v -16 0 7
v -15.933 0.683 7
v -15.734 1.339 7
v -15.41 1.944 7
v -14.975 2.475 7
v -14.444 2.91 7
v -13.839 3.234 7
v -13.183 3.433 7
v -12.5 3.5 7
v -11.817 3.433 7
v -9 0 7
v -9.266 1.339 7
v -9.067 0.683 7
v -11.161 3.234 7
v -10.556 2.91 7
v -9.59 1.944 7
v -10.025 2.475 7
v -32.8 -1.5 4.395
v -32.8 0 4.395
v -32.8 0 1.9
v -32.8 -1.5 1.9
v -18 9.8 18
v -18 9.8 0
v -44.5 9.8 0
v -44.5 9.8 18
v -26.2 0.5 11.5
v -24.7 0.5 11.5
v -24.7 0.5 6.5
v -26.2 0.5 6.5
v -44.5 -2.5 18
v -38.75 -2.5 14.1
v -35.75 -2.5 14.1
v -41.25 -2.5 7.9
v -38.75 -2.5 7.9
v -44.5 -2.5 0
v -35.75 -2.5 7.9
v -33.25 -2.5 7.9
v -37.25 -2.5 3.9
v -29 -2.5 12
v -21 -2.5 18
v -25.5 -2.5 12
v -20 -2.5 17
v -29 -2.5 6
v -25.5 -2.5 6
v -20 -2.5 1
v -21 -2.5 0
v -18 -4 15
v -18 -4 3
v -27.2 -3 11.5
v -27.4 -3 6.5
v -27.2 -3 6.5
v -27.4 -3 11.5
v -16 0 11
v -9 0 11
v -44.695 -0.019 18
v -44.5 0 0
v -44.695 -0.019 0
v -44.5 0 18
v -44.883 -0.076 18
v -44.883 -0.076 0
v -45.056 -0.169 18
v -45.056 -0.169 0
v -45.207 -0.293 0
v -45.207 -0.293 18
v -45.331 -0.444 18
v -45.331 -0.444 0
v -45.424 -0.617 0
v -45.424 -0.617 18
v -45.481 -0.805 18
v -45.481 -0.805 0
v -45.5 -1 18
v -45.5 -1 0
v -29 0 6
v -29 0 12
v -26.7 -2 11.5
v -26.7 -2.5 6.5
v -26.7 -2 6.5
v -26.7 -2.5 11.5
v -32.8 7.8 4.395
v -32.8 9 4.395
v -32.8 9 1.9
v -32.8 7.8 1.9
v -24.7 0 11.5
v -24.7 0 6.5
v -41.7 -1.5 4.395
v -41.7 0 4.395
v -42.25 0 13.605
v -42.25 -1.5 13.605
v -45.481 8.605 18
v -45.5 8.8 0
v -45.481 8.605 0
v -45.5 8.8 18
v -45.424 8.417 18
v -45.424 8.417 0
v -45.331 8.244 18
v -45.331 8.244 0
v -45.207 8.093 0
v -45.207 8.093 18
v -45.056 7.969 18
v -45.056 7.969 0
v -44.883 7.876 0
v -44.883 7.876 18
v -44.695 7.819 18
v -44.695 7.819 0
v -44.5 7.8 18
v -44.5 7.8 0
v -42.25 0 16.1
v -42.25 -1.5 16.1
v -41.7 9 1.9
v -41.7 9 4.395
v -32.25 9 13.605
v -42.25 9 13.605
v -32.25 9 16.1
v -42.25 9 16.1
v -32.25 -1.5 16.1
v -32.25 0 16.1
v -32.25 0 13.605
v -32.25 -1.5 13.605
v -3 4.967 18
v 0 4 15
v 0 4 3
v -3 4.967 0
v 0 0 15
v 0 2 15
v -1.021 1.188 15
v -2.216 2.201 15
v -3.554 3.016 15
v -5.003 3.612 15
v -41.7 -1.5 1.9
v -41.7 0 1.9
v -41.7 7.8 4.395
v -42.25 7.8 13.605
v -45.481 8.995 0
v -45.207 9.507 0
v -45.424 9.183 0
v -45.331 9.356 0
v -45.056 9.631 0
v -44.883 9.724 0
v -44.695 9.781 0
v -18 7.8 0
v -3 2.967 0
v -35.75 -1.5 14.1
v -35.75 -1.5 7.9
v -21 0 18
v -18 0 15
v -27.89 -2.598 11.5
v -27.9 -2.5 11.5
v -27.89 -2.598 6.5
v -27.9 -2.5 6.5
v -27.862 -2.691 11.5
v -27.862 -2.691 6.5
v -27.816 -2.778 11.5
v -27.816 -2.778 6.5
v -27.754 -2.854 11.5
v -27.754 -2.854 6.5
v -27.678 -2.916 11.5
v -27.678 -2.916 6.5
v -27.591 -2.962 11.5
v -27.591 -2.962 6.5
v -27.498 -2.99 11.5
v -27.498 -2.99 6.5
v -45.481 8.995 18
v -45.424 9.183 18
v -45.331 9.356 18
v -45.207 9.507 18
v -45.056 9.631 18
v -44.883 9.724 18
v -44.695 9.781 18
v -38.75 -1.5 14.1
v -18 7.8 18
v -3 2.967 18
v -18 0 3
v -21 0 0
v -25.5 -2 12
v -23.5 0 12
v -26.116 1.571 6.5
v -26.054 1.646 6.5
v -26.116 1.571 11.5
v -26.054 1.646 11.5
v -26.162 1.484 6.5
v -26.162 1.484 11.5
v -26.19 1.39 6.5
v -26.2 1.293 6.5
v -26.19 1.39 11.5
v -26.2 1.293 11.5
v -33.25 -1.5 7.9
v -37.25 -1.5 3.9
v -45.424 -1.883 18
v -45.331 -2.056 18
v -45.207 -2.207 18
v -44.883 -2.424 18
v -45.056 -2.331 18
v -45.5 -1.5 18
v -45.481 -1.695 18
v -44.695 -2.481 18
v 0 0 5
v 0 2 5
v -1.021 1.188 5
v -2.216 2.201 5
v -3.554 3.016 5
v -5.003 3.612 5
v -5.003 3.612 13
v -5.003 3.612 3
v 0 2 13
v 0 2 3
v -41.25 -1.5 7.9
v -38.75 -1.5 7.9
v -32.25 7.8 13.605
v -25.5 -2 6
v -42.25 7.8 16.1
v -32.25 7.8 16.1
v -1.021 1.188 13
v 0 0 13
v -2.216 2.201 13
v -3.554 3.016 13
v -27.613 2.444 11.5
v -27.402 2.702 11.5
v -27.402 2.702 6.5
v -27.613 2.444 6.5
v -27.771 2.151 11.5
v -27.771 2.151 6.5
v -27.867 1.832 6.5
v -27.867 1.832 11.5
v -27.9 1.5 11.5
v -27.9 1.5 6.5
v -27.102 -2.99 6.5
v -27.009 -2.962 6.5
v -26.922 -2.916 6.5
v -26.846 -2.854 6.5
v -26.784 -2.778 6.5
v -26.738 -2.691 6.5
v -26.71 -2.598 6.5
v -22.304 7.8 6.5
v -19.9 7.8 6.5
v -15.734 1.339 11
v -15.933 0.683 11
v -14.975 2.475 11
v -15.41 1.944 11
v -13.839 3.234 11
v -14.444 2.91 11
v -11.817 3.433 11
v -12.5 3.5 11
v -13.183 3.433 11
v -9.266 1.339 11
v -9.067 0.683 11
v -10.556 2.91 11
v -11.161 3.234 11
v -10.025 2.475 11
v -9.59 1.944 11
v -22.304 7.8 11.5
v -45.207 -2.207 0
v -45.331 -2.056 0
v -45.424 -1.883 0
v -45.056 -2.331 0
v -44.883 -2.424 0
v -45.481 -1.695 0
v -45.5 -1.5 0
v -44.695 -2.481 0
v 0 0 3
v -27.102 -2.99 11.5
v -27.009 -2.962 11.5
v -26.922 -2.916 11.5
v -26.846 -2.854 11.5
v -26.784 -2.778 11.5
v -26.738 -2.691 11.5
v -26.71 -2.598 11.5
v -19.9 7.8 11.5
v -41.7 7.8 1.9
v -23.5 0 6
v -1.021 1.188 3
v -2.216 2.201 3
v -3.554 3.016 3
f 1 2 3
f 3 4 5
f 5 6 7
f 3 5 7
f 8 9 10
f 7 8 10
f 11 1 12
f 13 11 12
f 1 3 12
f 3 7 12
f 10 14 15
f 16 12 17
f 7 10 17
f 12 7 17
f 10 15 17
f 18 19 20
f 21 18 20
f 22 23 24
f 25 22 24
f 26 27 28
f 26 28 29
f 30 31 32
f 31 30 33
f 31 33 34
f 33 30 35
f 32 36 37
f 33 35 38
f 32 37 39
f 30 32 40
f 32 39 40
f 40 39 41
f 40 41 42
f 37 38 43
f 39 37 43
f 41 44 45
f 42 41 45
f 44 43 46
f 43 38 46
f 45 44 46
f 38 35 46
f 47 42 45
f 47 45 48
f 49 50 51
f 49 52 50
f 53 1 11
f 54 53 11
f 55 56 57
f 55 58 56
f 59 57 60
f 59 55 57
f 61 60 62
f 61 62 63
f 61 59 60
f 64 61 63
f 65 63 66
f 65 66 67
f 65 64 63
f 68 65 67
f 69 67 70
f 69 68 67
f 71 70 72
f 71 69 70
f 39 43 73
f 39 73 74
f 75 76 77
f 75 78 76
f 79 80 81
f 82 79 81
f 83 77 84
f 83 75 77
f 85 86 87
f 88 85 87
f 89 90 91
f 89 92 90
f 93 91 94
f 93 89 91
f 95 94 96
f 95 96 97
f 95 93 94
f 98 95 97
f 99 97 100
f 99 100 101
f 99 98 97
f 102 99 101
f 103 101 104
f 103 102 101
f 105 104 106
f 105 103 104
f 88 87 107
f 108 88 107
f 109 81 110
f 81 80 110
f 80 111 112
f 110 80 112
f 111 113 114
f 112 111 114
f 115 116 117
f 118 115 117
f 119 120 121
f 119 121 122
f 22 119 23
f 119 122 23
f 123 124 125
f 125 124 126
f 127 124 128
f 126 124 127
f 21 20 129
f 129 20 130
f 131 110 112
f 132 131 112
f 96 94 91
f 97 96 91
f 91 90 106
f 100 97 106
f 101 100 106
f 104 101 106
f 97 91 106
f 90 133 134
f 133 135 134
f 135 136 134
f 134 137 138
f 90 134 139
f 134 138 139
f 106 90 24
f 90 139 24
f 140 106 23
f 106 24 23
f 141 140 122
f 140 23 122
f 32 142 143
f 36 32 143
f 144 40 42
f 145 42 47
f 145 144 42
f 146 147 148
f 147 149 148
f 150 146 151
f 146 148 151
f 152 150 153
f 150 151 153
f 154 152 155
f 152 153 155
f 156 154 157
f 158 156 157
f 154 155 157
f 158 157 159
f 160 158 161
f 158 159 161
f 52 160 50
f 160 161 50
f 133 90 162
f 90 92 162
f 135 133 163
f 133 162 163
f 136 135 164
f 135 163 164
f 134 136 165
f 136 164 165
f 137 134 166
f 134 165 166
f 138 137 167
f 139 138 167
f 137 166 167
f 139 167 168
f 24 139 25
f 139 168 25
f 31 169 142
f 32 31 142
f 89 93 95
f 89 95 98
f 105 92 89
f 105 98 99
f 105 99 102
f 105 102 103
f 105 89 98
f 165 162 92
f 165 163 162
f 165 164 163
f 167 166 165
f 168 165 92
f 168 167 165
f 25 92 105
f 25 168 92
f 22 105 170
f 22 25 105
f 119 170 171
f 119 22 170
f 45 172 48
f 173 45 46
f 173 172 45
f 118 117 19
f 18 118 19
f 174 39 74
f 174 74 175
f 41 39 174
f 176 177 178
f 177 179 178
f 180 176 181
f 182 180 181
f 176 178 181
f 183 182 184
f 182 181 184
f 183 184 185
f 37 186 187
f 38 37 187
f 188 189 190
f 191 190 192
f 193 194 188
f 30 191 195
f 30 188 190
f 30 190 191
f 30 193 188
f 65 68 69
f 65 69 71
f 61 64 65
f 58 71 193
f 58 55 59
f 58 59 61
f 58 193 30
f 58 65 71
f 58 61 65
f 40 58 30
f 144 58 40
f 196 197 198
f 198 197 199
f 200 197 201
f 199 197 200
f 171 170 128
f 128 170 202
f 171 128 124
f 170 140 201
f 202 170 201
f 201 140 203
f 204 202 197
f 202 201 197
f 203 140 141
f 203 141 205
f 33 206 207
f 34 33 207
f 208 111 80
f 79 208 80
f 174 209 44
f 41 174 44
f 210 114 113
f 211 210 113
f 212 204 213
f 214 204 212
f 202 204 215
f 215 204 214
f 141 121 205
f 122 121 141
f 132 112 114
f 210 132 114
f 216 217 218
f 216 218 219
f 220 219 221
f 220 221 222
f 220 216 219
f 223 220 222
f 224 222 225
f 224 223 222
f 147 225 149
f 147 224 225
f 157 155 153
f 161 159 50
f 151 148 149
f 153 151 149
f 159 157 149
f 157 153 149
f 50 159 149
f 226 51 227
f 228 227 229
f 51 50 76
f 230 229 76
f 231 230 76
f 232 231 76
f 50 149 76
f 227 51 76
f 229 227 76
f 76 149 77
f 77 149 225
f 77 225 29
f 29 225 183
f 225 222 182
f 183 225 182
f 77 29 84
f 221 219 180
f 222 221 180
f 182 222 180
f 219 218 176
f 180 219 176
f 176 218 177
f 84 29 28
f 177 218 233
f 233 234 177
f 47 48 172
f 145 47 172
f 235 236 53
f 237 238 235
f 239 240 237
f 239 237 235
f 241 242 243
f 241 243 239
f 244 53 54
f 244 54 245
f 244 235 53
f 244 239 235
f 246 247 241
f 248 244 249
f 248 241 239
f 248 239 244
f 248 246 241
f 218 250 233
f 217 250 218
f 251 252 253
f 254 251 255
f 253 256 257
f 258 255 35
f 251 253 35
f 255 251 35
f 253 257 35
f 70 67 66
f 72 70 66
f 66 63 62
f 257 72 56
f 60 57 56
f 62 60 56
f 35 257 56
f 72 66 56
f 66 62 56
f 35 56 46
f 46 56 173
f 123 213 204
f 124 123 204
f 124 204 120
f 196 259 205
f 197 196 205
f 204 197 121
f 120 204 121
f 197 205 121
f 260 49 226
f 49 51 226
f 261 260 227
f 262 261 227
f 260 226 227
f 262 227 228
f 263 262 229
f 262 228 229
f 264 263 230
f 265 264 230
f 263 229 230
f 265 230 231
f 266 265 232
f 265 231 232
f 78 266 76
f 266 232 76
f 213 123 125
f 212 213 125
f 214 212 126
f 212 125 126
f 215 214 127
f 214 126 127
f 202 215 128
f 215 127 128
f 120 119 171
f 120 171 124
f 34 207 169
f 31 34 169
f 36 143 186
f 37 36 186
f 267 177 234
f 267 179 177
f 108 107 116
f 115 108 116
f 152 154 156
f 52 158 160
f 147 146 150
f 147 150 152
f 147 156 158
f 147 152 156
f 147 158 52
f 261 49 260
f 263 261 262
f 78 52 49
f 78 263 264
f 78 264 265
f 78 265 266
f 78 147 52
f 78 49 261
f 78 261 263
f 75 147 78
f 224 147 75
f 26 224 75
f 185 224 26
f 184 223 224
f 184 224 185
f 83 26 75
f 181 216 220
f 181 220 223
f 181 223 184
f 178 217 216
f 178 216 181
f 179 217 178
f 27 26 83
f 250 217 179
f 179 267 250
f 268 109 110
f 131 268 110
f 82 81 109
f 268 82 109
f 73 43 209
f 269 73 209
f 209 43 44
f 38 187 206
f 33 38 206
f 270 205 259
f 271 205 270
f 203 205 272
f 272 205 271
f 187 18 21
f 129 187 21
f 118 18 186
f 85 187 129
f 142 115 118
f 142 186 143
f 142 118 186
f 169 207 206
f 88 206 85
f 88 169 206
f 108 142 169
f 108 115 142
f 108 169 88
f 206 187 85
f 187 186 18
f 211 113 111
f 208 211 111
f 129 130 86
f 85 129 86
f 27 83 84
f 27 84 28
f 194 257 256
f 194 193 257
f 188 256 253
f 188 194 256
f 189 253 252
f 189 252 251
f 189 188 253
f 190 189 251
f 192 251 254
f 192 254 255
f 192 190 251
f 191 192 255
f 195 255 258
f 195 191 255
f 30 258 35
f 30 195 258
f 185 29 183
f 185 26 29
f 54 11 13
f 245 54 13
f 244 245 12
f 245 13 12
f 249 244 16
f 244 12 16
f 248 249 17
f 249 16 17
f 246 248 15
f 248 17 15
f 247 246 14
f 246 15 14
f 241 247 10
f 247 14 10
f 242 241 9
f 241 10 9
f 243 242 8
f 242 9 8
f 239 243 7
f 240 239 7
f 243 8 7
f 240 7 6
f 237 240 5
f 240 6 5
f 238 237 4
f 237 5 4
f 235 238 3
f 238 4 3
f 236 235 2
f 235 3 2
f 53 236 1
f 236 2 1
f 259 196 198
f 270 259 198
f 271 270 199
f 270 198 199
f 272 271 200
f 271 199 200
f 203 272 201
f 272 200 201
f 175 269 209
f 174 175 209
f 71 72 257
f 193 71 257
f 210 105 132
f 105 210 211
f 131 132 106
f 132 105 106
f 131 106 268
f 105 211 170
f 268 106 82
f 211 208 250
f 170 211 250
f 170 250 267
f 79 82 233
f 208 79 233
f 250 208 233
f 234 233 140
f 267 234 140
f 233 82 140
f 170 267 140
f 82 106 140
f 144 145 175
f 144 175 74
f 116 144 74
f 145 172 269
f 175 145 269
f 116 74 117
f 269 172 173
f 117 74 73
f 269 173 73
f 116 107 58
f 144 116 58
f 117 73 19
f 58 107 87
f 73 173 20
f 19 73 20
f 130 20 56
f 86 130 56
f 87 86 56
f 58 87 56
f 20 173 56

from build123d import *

# Parameters (mm, degrees)
BOSS_EXTRUDE1_DEPTH     = 18
BOSS_EXTRUDE1_2_DEPTH   = 18
SKETCH2_W               = 5.5
SKETCH2_H               = 6
CUT_EXTRUDE1_DEPTH      = 3
BOSS_EXTRUDE2_DEPTH     = 6
BOSS_EXTRUDE3_START     = -9
BOSS_EXTRUDE3_DEPTH     = 2.5
FILLET7_R               = 1
FILLET8_R               = 1
FILLET10_R              = 1
FILLET11_R              = 1
BOSS_EXTRUDE4_START     = -3
BOSS_EXTRUDE4_DEPTH     = 2
BOSS_EXTRUDE5_START     = -13
BOSS_EXTRUDE5_DEPTH     = 2
FILLET12_R              = 0.5
FILLET13_R              = 0.5
CUT_EXTRUDE2_DEPTH      = 1.5
CUT_EXTRUDE2_DEPTH_BACK = 9
CUT_EXTRUDE3_DEPTH      = 51.839846577
CUT_EXTRUDE9_DEPTH      = 51.453344785
CUT_EXTRUDE9_DEPTH_BACK = 2.5
CUT_EXTRUDE10_DEPTH     = 1
BOSS_EXTRUDE8_START     = 7
BOSS_EXTRUDE8_DEPTH     = 4


with BuildPart() as part:
    # Sketch1 → Boss-Extrude1 (new body)
    with BuildSketch(Plane.XY):
        Polygon((0, 4), (-18, 9.8), (-45.5, 9.8), (-45.5, 7.8), (-18, 7.8), (0, 2), align=None)
    extrude(amount=BOSS_EXTRUDE1_DEPTH)

    # Sketch4 → Boss-Extrude3 (add, symmetric)
    with BuildSketch(Plane.XY.offset(18).offset(BOSS_EXTRUDE3_START)):
        with BuildLine():
            Line((-26.7, -2), (-24.7, 0))
            Line((-24.7, 0), (-24.7, 0.5))
            Line((-24.7, 0.5), (-26.2, 0.5))
            Line((-26.2, 0.5), (-26.2, 1.5))
            Line((-26.2, 1.5), (-19.9, 7.8))
            Line((-19.9, 7.8), (-22.304163056, 7.8))
            Line((-22.304163056, 7.8), (-27.402081528, 2.702081528))
            ThreePointArc((-27.402081528, 2.702081528), (-27.770595205, 2.150561835), (-27.9, 1.5))
            Line((-27.9, 1.5), (-27.9, -3))
            Line((-27.9, -3), (-26.7, -3))
            Line((-26.7, -3), (-26.7, -2))
        make_face()
    extrude(amount=BOSS_EXTRUDE3_DEPTH, both=True)

    # Fillet8
    fillet8_edges = [part.edges().sort_by_distance(p)[0] for p in [
        (-45.5, 7.8, 9),
    ]]
    fillet(fillet8_edges, radius=FILLET8_R)

    # Fillet10
    fillet10_edges = [part.edges().sort_by_distance(p)[0] for p in [
        (-45.5, 9.8, 9),
    ]]
    fillet(fillet10_edges, radius=FILLET10_R - 0.0001)  # a hair under: the kernel refuses the full size

    # Sketch5 → Boss-Extrude4 (add)
    with BuildSketch(Plane.XY.offset(18).offset(BOSS_EXTRUDE4_START)):
        with BuildLine():
            Line((0, 2), (0, 0))
            ThreePointArc((0, 0), (-2.215757041, 2.201466243), (-5.002612018, 3.611952761))
            Line((-5.002612018, 3.611952761), (0, 2))
        make_face()
    extrude(amount=-BOSS_EXTRUDE4_DEPTH)

    # Sketch5<2> → Boss-Extrude5 (add)
    with BuildSketch(Plane.XY.offset(18).offset(BOSS_EXTRUDE5_START)):
        with BuildLine():
            Line((0, 2), (0, 0))
            ThreePointArc((0, 0), (-2.215757041, 2.201466243), (-5.002612018, 3.611952761))
            Line((-5.002612018, 3.611952761), (0, 2))
        make_face()
    extrude(amount=-BOSS_EXTRUDE5_DEPTH)

    # Fillet12
    fillet12_edges = [part.edges().sort_by_distance(p)[0] for p in [
        (-26.7, -3, 9),
        (-27.9, -3, 9),
    ]]
    fillet(fillet12_edges, radius=FILLET12_R)

    # Fillet13
    fillet13_edges = [part.edges().sort_by_distance(p)[0] for p in [
        (-26.2, 1.5, 9),
    ]]
    fillet(fillet13_edges, radius=FILLET13_R)


with BuildPart() as body_2:
    # Sketch1 → Boss-Extrude1 2 (new body)
    with BuildSketch(Plane.XY):
        Polygon((-18, 0), (-45.5, 0), (-45.5, -2.5), (-20, -2.5), (-18, -4), align=None)
    extrude(amount=BOSS_EXTRUDE1_2_DEPTH)

    # Sketch2 → Cut-Extrude1 (cut)
    with BuildSketch(Plane.XZ.offset(2.5)):
        with Locations((-26.25, 9)):
            Rectangle(SKETCH2_W, SKETCH2_H)
    extrude(amount=-CUT_EXTRUDE1_DEPTH, mode=Mode.SUBTRACT)

    # Sketch3 → Boss-Extrude2 (add)
    with BuildSketch(Plane.XY.offset(6)):
        Polygon((-23.5, 0), (-25.5, -2), (-25.5, -2.5), (-23.5, -2.5), align=None)
    extrude(amount=BOSS_EXTRUDE2_DEPTH)

    # Fillet7
    fillet7_edges = [body_2.edges().sort_by_distance(p)[0] for p in [
        (-45.5, 0, 9),
    ]]
    fillet(fillet7_edges, radius=FILLET7_R)

    # Fillet11
    fillet11_edges = [body_2.edges().sort_by_distance(p)[0] for p in [
        (-45.5, -2.5, 9),
    ]]
    fillet(fillet11_edges, radius=FILLET11_R)


with BuildPart() as cut_extrude2_tool:
    # Sketch6 → Cut-Extrude2 (new, two sides: drawn at the far end of the back side and taken through both)
    with BuildSketch(Plane.XZ.offset(-CUT_EXTRUDE2_DEPTH_BACK)):
        Polygon((-32.8, 1.9), (-41.7, 1.9), (-41.7, 4.395495943), (-42.25, 13.604504057), (-42.25, 16.1), (-32.25, 16.1), (-32.25, 13.604504057), (-32.8, 4.395495943), align=None)
    extrude(amount=CUT_EXTRUDE2_DEPTH + CUT_EXTRUDE2_DEPTH_BACK)


with BuildPart() as part_1:
    add(part.part)

    # Cut-Extrude2: cut by cut_extrude2_tool
    add(cut_extrude2_tool.part, mode=Mode.SUBTRACT)

    # Sketch7 → Cut-Extrude3 (cut, through all)
    with BuildSketch(Plane(origin=(0, 9.8, 0), x_dir=(1, 0, 0), z_dir=(0, 1, 0))):
        Polygon((0, -3), (-3, 0), (-45.5, 0), (-45.5, -18), (-3, -18), (0, -15), (2, -15), (2, -20), (-48, -20), (-48, 2), (2, 2), (2, -3), align=None)
    extrude(amount=-CUT_EXTRUDE3_DEPTH, mode=Mode.SUBTRACT)


with BuildPart() as body_2_1:
    add(body_2.part)

    # Cut-Extrude2: cut by cut_extrude2_tool
    add(cut_extrude2_tool.part, mode=Mode.SUBTRACT)

    # Sketch8 → Cut-Extrude9 (cut, two sides: drawn at the far end of the back side and taken through both)
    with BuildSketch(Plane.XZ.offset(2.5).offset(-CUT_EXTRUDE9_DEPTH_BACK)):
        Polygon((-18, 15), (-16, 15), (-16, 20), (-47.5, 20), (-47.5, -2), (-16, -2), (-16, 3), (-18, 3), (-21, 0), (-45.5, 0), (-45.5, 18), (-21, 18), align=None)
    extrude(amount=CUT_EXTRUDE9_DEPTH + CUT_EXTRUDE9_DEPTH_BACK, mode=Mode.SUBTRACT)

    # Sketch9 → Cut-Extrude10 (cut)
    with BuildSketch(Plane.XZ.offset(1.5)):
        Polygon((-38.75, 14.1), (-35.75, 14.1), (-35.75, 7.9), (-33.25, 7.9), (-37.25, 3.9), (-41.25, 7.9), (-38.75, 7.9), align=None)
    extrude(amount=CUT_EXTRUDE10_DEPTH, mode=Mode.SUBTRACT)


with BuildPart() as body_3:
    # Sketch11 → Boss-Extrude8 (new body)
    with BuildSketch(Plane.XY.offset(BOSS_EXTRUDE8_START)):
        with BuildLine():
            Line((-16, 0), (-9, 0))
            ThreePointArc((-9, 0), (-12.5, 3.5), (-16, 0))
        make_face()
    extrude(amount=BOSS_EXTRUDE8_DEPTH)


solid = Compound([part_1.part, body_2_1.part, body_3.part])
